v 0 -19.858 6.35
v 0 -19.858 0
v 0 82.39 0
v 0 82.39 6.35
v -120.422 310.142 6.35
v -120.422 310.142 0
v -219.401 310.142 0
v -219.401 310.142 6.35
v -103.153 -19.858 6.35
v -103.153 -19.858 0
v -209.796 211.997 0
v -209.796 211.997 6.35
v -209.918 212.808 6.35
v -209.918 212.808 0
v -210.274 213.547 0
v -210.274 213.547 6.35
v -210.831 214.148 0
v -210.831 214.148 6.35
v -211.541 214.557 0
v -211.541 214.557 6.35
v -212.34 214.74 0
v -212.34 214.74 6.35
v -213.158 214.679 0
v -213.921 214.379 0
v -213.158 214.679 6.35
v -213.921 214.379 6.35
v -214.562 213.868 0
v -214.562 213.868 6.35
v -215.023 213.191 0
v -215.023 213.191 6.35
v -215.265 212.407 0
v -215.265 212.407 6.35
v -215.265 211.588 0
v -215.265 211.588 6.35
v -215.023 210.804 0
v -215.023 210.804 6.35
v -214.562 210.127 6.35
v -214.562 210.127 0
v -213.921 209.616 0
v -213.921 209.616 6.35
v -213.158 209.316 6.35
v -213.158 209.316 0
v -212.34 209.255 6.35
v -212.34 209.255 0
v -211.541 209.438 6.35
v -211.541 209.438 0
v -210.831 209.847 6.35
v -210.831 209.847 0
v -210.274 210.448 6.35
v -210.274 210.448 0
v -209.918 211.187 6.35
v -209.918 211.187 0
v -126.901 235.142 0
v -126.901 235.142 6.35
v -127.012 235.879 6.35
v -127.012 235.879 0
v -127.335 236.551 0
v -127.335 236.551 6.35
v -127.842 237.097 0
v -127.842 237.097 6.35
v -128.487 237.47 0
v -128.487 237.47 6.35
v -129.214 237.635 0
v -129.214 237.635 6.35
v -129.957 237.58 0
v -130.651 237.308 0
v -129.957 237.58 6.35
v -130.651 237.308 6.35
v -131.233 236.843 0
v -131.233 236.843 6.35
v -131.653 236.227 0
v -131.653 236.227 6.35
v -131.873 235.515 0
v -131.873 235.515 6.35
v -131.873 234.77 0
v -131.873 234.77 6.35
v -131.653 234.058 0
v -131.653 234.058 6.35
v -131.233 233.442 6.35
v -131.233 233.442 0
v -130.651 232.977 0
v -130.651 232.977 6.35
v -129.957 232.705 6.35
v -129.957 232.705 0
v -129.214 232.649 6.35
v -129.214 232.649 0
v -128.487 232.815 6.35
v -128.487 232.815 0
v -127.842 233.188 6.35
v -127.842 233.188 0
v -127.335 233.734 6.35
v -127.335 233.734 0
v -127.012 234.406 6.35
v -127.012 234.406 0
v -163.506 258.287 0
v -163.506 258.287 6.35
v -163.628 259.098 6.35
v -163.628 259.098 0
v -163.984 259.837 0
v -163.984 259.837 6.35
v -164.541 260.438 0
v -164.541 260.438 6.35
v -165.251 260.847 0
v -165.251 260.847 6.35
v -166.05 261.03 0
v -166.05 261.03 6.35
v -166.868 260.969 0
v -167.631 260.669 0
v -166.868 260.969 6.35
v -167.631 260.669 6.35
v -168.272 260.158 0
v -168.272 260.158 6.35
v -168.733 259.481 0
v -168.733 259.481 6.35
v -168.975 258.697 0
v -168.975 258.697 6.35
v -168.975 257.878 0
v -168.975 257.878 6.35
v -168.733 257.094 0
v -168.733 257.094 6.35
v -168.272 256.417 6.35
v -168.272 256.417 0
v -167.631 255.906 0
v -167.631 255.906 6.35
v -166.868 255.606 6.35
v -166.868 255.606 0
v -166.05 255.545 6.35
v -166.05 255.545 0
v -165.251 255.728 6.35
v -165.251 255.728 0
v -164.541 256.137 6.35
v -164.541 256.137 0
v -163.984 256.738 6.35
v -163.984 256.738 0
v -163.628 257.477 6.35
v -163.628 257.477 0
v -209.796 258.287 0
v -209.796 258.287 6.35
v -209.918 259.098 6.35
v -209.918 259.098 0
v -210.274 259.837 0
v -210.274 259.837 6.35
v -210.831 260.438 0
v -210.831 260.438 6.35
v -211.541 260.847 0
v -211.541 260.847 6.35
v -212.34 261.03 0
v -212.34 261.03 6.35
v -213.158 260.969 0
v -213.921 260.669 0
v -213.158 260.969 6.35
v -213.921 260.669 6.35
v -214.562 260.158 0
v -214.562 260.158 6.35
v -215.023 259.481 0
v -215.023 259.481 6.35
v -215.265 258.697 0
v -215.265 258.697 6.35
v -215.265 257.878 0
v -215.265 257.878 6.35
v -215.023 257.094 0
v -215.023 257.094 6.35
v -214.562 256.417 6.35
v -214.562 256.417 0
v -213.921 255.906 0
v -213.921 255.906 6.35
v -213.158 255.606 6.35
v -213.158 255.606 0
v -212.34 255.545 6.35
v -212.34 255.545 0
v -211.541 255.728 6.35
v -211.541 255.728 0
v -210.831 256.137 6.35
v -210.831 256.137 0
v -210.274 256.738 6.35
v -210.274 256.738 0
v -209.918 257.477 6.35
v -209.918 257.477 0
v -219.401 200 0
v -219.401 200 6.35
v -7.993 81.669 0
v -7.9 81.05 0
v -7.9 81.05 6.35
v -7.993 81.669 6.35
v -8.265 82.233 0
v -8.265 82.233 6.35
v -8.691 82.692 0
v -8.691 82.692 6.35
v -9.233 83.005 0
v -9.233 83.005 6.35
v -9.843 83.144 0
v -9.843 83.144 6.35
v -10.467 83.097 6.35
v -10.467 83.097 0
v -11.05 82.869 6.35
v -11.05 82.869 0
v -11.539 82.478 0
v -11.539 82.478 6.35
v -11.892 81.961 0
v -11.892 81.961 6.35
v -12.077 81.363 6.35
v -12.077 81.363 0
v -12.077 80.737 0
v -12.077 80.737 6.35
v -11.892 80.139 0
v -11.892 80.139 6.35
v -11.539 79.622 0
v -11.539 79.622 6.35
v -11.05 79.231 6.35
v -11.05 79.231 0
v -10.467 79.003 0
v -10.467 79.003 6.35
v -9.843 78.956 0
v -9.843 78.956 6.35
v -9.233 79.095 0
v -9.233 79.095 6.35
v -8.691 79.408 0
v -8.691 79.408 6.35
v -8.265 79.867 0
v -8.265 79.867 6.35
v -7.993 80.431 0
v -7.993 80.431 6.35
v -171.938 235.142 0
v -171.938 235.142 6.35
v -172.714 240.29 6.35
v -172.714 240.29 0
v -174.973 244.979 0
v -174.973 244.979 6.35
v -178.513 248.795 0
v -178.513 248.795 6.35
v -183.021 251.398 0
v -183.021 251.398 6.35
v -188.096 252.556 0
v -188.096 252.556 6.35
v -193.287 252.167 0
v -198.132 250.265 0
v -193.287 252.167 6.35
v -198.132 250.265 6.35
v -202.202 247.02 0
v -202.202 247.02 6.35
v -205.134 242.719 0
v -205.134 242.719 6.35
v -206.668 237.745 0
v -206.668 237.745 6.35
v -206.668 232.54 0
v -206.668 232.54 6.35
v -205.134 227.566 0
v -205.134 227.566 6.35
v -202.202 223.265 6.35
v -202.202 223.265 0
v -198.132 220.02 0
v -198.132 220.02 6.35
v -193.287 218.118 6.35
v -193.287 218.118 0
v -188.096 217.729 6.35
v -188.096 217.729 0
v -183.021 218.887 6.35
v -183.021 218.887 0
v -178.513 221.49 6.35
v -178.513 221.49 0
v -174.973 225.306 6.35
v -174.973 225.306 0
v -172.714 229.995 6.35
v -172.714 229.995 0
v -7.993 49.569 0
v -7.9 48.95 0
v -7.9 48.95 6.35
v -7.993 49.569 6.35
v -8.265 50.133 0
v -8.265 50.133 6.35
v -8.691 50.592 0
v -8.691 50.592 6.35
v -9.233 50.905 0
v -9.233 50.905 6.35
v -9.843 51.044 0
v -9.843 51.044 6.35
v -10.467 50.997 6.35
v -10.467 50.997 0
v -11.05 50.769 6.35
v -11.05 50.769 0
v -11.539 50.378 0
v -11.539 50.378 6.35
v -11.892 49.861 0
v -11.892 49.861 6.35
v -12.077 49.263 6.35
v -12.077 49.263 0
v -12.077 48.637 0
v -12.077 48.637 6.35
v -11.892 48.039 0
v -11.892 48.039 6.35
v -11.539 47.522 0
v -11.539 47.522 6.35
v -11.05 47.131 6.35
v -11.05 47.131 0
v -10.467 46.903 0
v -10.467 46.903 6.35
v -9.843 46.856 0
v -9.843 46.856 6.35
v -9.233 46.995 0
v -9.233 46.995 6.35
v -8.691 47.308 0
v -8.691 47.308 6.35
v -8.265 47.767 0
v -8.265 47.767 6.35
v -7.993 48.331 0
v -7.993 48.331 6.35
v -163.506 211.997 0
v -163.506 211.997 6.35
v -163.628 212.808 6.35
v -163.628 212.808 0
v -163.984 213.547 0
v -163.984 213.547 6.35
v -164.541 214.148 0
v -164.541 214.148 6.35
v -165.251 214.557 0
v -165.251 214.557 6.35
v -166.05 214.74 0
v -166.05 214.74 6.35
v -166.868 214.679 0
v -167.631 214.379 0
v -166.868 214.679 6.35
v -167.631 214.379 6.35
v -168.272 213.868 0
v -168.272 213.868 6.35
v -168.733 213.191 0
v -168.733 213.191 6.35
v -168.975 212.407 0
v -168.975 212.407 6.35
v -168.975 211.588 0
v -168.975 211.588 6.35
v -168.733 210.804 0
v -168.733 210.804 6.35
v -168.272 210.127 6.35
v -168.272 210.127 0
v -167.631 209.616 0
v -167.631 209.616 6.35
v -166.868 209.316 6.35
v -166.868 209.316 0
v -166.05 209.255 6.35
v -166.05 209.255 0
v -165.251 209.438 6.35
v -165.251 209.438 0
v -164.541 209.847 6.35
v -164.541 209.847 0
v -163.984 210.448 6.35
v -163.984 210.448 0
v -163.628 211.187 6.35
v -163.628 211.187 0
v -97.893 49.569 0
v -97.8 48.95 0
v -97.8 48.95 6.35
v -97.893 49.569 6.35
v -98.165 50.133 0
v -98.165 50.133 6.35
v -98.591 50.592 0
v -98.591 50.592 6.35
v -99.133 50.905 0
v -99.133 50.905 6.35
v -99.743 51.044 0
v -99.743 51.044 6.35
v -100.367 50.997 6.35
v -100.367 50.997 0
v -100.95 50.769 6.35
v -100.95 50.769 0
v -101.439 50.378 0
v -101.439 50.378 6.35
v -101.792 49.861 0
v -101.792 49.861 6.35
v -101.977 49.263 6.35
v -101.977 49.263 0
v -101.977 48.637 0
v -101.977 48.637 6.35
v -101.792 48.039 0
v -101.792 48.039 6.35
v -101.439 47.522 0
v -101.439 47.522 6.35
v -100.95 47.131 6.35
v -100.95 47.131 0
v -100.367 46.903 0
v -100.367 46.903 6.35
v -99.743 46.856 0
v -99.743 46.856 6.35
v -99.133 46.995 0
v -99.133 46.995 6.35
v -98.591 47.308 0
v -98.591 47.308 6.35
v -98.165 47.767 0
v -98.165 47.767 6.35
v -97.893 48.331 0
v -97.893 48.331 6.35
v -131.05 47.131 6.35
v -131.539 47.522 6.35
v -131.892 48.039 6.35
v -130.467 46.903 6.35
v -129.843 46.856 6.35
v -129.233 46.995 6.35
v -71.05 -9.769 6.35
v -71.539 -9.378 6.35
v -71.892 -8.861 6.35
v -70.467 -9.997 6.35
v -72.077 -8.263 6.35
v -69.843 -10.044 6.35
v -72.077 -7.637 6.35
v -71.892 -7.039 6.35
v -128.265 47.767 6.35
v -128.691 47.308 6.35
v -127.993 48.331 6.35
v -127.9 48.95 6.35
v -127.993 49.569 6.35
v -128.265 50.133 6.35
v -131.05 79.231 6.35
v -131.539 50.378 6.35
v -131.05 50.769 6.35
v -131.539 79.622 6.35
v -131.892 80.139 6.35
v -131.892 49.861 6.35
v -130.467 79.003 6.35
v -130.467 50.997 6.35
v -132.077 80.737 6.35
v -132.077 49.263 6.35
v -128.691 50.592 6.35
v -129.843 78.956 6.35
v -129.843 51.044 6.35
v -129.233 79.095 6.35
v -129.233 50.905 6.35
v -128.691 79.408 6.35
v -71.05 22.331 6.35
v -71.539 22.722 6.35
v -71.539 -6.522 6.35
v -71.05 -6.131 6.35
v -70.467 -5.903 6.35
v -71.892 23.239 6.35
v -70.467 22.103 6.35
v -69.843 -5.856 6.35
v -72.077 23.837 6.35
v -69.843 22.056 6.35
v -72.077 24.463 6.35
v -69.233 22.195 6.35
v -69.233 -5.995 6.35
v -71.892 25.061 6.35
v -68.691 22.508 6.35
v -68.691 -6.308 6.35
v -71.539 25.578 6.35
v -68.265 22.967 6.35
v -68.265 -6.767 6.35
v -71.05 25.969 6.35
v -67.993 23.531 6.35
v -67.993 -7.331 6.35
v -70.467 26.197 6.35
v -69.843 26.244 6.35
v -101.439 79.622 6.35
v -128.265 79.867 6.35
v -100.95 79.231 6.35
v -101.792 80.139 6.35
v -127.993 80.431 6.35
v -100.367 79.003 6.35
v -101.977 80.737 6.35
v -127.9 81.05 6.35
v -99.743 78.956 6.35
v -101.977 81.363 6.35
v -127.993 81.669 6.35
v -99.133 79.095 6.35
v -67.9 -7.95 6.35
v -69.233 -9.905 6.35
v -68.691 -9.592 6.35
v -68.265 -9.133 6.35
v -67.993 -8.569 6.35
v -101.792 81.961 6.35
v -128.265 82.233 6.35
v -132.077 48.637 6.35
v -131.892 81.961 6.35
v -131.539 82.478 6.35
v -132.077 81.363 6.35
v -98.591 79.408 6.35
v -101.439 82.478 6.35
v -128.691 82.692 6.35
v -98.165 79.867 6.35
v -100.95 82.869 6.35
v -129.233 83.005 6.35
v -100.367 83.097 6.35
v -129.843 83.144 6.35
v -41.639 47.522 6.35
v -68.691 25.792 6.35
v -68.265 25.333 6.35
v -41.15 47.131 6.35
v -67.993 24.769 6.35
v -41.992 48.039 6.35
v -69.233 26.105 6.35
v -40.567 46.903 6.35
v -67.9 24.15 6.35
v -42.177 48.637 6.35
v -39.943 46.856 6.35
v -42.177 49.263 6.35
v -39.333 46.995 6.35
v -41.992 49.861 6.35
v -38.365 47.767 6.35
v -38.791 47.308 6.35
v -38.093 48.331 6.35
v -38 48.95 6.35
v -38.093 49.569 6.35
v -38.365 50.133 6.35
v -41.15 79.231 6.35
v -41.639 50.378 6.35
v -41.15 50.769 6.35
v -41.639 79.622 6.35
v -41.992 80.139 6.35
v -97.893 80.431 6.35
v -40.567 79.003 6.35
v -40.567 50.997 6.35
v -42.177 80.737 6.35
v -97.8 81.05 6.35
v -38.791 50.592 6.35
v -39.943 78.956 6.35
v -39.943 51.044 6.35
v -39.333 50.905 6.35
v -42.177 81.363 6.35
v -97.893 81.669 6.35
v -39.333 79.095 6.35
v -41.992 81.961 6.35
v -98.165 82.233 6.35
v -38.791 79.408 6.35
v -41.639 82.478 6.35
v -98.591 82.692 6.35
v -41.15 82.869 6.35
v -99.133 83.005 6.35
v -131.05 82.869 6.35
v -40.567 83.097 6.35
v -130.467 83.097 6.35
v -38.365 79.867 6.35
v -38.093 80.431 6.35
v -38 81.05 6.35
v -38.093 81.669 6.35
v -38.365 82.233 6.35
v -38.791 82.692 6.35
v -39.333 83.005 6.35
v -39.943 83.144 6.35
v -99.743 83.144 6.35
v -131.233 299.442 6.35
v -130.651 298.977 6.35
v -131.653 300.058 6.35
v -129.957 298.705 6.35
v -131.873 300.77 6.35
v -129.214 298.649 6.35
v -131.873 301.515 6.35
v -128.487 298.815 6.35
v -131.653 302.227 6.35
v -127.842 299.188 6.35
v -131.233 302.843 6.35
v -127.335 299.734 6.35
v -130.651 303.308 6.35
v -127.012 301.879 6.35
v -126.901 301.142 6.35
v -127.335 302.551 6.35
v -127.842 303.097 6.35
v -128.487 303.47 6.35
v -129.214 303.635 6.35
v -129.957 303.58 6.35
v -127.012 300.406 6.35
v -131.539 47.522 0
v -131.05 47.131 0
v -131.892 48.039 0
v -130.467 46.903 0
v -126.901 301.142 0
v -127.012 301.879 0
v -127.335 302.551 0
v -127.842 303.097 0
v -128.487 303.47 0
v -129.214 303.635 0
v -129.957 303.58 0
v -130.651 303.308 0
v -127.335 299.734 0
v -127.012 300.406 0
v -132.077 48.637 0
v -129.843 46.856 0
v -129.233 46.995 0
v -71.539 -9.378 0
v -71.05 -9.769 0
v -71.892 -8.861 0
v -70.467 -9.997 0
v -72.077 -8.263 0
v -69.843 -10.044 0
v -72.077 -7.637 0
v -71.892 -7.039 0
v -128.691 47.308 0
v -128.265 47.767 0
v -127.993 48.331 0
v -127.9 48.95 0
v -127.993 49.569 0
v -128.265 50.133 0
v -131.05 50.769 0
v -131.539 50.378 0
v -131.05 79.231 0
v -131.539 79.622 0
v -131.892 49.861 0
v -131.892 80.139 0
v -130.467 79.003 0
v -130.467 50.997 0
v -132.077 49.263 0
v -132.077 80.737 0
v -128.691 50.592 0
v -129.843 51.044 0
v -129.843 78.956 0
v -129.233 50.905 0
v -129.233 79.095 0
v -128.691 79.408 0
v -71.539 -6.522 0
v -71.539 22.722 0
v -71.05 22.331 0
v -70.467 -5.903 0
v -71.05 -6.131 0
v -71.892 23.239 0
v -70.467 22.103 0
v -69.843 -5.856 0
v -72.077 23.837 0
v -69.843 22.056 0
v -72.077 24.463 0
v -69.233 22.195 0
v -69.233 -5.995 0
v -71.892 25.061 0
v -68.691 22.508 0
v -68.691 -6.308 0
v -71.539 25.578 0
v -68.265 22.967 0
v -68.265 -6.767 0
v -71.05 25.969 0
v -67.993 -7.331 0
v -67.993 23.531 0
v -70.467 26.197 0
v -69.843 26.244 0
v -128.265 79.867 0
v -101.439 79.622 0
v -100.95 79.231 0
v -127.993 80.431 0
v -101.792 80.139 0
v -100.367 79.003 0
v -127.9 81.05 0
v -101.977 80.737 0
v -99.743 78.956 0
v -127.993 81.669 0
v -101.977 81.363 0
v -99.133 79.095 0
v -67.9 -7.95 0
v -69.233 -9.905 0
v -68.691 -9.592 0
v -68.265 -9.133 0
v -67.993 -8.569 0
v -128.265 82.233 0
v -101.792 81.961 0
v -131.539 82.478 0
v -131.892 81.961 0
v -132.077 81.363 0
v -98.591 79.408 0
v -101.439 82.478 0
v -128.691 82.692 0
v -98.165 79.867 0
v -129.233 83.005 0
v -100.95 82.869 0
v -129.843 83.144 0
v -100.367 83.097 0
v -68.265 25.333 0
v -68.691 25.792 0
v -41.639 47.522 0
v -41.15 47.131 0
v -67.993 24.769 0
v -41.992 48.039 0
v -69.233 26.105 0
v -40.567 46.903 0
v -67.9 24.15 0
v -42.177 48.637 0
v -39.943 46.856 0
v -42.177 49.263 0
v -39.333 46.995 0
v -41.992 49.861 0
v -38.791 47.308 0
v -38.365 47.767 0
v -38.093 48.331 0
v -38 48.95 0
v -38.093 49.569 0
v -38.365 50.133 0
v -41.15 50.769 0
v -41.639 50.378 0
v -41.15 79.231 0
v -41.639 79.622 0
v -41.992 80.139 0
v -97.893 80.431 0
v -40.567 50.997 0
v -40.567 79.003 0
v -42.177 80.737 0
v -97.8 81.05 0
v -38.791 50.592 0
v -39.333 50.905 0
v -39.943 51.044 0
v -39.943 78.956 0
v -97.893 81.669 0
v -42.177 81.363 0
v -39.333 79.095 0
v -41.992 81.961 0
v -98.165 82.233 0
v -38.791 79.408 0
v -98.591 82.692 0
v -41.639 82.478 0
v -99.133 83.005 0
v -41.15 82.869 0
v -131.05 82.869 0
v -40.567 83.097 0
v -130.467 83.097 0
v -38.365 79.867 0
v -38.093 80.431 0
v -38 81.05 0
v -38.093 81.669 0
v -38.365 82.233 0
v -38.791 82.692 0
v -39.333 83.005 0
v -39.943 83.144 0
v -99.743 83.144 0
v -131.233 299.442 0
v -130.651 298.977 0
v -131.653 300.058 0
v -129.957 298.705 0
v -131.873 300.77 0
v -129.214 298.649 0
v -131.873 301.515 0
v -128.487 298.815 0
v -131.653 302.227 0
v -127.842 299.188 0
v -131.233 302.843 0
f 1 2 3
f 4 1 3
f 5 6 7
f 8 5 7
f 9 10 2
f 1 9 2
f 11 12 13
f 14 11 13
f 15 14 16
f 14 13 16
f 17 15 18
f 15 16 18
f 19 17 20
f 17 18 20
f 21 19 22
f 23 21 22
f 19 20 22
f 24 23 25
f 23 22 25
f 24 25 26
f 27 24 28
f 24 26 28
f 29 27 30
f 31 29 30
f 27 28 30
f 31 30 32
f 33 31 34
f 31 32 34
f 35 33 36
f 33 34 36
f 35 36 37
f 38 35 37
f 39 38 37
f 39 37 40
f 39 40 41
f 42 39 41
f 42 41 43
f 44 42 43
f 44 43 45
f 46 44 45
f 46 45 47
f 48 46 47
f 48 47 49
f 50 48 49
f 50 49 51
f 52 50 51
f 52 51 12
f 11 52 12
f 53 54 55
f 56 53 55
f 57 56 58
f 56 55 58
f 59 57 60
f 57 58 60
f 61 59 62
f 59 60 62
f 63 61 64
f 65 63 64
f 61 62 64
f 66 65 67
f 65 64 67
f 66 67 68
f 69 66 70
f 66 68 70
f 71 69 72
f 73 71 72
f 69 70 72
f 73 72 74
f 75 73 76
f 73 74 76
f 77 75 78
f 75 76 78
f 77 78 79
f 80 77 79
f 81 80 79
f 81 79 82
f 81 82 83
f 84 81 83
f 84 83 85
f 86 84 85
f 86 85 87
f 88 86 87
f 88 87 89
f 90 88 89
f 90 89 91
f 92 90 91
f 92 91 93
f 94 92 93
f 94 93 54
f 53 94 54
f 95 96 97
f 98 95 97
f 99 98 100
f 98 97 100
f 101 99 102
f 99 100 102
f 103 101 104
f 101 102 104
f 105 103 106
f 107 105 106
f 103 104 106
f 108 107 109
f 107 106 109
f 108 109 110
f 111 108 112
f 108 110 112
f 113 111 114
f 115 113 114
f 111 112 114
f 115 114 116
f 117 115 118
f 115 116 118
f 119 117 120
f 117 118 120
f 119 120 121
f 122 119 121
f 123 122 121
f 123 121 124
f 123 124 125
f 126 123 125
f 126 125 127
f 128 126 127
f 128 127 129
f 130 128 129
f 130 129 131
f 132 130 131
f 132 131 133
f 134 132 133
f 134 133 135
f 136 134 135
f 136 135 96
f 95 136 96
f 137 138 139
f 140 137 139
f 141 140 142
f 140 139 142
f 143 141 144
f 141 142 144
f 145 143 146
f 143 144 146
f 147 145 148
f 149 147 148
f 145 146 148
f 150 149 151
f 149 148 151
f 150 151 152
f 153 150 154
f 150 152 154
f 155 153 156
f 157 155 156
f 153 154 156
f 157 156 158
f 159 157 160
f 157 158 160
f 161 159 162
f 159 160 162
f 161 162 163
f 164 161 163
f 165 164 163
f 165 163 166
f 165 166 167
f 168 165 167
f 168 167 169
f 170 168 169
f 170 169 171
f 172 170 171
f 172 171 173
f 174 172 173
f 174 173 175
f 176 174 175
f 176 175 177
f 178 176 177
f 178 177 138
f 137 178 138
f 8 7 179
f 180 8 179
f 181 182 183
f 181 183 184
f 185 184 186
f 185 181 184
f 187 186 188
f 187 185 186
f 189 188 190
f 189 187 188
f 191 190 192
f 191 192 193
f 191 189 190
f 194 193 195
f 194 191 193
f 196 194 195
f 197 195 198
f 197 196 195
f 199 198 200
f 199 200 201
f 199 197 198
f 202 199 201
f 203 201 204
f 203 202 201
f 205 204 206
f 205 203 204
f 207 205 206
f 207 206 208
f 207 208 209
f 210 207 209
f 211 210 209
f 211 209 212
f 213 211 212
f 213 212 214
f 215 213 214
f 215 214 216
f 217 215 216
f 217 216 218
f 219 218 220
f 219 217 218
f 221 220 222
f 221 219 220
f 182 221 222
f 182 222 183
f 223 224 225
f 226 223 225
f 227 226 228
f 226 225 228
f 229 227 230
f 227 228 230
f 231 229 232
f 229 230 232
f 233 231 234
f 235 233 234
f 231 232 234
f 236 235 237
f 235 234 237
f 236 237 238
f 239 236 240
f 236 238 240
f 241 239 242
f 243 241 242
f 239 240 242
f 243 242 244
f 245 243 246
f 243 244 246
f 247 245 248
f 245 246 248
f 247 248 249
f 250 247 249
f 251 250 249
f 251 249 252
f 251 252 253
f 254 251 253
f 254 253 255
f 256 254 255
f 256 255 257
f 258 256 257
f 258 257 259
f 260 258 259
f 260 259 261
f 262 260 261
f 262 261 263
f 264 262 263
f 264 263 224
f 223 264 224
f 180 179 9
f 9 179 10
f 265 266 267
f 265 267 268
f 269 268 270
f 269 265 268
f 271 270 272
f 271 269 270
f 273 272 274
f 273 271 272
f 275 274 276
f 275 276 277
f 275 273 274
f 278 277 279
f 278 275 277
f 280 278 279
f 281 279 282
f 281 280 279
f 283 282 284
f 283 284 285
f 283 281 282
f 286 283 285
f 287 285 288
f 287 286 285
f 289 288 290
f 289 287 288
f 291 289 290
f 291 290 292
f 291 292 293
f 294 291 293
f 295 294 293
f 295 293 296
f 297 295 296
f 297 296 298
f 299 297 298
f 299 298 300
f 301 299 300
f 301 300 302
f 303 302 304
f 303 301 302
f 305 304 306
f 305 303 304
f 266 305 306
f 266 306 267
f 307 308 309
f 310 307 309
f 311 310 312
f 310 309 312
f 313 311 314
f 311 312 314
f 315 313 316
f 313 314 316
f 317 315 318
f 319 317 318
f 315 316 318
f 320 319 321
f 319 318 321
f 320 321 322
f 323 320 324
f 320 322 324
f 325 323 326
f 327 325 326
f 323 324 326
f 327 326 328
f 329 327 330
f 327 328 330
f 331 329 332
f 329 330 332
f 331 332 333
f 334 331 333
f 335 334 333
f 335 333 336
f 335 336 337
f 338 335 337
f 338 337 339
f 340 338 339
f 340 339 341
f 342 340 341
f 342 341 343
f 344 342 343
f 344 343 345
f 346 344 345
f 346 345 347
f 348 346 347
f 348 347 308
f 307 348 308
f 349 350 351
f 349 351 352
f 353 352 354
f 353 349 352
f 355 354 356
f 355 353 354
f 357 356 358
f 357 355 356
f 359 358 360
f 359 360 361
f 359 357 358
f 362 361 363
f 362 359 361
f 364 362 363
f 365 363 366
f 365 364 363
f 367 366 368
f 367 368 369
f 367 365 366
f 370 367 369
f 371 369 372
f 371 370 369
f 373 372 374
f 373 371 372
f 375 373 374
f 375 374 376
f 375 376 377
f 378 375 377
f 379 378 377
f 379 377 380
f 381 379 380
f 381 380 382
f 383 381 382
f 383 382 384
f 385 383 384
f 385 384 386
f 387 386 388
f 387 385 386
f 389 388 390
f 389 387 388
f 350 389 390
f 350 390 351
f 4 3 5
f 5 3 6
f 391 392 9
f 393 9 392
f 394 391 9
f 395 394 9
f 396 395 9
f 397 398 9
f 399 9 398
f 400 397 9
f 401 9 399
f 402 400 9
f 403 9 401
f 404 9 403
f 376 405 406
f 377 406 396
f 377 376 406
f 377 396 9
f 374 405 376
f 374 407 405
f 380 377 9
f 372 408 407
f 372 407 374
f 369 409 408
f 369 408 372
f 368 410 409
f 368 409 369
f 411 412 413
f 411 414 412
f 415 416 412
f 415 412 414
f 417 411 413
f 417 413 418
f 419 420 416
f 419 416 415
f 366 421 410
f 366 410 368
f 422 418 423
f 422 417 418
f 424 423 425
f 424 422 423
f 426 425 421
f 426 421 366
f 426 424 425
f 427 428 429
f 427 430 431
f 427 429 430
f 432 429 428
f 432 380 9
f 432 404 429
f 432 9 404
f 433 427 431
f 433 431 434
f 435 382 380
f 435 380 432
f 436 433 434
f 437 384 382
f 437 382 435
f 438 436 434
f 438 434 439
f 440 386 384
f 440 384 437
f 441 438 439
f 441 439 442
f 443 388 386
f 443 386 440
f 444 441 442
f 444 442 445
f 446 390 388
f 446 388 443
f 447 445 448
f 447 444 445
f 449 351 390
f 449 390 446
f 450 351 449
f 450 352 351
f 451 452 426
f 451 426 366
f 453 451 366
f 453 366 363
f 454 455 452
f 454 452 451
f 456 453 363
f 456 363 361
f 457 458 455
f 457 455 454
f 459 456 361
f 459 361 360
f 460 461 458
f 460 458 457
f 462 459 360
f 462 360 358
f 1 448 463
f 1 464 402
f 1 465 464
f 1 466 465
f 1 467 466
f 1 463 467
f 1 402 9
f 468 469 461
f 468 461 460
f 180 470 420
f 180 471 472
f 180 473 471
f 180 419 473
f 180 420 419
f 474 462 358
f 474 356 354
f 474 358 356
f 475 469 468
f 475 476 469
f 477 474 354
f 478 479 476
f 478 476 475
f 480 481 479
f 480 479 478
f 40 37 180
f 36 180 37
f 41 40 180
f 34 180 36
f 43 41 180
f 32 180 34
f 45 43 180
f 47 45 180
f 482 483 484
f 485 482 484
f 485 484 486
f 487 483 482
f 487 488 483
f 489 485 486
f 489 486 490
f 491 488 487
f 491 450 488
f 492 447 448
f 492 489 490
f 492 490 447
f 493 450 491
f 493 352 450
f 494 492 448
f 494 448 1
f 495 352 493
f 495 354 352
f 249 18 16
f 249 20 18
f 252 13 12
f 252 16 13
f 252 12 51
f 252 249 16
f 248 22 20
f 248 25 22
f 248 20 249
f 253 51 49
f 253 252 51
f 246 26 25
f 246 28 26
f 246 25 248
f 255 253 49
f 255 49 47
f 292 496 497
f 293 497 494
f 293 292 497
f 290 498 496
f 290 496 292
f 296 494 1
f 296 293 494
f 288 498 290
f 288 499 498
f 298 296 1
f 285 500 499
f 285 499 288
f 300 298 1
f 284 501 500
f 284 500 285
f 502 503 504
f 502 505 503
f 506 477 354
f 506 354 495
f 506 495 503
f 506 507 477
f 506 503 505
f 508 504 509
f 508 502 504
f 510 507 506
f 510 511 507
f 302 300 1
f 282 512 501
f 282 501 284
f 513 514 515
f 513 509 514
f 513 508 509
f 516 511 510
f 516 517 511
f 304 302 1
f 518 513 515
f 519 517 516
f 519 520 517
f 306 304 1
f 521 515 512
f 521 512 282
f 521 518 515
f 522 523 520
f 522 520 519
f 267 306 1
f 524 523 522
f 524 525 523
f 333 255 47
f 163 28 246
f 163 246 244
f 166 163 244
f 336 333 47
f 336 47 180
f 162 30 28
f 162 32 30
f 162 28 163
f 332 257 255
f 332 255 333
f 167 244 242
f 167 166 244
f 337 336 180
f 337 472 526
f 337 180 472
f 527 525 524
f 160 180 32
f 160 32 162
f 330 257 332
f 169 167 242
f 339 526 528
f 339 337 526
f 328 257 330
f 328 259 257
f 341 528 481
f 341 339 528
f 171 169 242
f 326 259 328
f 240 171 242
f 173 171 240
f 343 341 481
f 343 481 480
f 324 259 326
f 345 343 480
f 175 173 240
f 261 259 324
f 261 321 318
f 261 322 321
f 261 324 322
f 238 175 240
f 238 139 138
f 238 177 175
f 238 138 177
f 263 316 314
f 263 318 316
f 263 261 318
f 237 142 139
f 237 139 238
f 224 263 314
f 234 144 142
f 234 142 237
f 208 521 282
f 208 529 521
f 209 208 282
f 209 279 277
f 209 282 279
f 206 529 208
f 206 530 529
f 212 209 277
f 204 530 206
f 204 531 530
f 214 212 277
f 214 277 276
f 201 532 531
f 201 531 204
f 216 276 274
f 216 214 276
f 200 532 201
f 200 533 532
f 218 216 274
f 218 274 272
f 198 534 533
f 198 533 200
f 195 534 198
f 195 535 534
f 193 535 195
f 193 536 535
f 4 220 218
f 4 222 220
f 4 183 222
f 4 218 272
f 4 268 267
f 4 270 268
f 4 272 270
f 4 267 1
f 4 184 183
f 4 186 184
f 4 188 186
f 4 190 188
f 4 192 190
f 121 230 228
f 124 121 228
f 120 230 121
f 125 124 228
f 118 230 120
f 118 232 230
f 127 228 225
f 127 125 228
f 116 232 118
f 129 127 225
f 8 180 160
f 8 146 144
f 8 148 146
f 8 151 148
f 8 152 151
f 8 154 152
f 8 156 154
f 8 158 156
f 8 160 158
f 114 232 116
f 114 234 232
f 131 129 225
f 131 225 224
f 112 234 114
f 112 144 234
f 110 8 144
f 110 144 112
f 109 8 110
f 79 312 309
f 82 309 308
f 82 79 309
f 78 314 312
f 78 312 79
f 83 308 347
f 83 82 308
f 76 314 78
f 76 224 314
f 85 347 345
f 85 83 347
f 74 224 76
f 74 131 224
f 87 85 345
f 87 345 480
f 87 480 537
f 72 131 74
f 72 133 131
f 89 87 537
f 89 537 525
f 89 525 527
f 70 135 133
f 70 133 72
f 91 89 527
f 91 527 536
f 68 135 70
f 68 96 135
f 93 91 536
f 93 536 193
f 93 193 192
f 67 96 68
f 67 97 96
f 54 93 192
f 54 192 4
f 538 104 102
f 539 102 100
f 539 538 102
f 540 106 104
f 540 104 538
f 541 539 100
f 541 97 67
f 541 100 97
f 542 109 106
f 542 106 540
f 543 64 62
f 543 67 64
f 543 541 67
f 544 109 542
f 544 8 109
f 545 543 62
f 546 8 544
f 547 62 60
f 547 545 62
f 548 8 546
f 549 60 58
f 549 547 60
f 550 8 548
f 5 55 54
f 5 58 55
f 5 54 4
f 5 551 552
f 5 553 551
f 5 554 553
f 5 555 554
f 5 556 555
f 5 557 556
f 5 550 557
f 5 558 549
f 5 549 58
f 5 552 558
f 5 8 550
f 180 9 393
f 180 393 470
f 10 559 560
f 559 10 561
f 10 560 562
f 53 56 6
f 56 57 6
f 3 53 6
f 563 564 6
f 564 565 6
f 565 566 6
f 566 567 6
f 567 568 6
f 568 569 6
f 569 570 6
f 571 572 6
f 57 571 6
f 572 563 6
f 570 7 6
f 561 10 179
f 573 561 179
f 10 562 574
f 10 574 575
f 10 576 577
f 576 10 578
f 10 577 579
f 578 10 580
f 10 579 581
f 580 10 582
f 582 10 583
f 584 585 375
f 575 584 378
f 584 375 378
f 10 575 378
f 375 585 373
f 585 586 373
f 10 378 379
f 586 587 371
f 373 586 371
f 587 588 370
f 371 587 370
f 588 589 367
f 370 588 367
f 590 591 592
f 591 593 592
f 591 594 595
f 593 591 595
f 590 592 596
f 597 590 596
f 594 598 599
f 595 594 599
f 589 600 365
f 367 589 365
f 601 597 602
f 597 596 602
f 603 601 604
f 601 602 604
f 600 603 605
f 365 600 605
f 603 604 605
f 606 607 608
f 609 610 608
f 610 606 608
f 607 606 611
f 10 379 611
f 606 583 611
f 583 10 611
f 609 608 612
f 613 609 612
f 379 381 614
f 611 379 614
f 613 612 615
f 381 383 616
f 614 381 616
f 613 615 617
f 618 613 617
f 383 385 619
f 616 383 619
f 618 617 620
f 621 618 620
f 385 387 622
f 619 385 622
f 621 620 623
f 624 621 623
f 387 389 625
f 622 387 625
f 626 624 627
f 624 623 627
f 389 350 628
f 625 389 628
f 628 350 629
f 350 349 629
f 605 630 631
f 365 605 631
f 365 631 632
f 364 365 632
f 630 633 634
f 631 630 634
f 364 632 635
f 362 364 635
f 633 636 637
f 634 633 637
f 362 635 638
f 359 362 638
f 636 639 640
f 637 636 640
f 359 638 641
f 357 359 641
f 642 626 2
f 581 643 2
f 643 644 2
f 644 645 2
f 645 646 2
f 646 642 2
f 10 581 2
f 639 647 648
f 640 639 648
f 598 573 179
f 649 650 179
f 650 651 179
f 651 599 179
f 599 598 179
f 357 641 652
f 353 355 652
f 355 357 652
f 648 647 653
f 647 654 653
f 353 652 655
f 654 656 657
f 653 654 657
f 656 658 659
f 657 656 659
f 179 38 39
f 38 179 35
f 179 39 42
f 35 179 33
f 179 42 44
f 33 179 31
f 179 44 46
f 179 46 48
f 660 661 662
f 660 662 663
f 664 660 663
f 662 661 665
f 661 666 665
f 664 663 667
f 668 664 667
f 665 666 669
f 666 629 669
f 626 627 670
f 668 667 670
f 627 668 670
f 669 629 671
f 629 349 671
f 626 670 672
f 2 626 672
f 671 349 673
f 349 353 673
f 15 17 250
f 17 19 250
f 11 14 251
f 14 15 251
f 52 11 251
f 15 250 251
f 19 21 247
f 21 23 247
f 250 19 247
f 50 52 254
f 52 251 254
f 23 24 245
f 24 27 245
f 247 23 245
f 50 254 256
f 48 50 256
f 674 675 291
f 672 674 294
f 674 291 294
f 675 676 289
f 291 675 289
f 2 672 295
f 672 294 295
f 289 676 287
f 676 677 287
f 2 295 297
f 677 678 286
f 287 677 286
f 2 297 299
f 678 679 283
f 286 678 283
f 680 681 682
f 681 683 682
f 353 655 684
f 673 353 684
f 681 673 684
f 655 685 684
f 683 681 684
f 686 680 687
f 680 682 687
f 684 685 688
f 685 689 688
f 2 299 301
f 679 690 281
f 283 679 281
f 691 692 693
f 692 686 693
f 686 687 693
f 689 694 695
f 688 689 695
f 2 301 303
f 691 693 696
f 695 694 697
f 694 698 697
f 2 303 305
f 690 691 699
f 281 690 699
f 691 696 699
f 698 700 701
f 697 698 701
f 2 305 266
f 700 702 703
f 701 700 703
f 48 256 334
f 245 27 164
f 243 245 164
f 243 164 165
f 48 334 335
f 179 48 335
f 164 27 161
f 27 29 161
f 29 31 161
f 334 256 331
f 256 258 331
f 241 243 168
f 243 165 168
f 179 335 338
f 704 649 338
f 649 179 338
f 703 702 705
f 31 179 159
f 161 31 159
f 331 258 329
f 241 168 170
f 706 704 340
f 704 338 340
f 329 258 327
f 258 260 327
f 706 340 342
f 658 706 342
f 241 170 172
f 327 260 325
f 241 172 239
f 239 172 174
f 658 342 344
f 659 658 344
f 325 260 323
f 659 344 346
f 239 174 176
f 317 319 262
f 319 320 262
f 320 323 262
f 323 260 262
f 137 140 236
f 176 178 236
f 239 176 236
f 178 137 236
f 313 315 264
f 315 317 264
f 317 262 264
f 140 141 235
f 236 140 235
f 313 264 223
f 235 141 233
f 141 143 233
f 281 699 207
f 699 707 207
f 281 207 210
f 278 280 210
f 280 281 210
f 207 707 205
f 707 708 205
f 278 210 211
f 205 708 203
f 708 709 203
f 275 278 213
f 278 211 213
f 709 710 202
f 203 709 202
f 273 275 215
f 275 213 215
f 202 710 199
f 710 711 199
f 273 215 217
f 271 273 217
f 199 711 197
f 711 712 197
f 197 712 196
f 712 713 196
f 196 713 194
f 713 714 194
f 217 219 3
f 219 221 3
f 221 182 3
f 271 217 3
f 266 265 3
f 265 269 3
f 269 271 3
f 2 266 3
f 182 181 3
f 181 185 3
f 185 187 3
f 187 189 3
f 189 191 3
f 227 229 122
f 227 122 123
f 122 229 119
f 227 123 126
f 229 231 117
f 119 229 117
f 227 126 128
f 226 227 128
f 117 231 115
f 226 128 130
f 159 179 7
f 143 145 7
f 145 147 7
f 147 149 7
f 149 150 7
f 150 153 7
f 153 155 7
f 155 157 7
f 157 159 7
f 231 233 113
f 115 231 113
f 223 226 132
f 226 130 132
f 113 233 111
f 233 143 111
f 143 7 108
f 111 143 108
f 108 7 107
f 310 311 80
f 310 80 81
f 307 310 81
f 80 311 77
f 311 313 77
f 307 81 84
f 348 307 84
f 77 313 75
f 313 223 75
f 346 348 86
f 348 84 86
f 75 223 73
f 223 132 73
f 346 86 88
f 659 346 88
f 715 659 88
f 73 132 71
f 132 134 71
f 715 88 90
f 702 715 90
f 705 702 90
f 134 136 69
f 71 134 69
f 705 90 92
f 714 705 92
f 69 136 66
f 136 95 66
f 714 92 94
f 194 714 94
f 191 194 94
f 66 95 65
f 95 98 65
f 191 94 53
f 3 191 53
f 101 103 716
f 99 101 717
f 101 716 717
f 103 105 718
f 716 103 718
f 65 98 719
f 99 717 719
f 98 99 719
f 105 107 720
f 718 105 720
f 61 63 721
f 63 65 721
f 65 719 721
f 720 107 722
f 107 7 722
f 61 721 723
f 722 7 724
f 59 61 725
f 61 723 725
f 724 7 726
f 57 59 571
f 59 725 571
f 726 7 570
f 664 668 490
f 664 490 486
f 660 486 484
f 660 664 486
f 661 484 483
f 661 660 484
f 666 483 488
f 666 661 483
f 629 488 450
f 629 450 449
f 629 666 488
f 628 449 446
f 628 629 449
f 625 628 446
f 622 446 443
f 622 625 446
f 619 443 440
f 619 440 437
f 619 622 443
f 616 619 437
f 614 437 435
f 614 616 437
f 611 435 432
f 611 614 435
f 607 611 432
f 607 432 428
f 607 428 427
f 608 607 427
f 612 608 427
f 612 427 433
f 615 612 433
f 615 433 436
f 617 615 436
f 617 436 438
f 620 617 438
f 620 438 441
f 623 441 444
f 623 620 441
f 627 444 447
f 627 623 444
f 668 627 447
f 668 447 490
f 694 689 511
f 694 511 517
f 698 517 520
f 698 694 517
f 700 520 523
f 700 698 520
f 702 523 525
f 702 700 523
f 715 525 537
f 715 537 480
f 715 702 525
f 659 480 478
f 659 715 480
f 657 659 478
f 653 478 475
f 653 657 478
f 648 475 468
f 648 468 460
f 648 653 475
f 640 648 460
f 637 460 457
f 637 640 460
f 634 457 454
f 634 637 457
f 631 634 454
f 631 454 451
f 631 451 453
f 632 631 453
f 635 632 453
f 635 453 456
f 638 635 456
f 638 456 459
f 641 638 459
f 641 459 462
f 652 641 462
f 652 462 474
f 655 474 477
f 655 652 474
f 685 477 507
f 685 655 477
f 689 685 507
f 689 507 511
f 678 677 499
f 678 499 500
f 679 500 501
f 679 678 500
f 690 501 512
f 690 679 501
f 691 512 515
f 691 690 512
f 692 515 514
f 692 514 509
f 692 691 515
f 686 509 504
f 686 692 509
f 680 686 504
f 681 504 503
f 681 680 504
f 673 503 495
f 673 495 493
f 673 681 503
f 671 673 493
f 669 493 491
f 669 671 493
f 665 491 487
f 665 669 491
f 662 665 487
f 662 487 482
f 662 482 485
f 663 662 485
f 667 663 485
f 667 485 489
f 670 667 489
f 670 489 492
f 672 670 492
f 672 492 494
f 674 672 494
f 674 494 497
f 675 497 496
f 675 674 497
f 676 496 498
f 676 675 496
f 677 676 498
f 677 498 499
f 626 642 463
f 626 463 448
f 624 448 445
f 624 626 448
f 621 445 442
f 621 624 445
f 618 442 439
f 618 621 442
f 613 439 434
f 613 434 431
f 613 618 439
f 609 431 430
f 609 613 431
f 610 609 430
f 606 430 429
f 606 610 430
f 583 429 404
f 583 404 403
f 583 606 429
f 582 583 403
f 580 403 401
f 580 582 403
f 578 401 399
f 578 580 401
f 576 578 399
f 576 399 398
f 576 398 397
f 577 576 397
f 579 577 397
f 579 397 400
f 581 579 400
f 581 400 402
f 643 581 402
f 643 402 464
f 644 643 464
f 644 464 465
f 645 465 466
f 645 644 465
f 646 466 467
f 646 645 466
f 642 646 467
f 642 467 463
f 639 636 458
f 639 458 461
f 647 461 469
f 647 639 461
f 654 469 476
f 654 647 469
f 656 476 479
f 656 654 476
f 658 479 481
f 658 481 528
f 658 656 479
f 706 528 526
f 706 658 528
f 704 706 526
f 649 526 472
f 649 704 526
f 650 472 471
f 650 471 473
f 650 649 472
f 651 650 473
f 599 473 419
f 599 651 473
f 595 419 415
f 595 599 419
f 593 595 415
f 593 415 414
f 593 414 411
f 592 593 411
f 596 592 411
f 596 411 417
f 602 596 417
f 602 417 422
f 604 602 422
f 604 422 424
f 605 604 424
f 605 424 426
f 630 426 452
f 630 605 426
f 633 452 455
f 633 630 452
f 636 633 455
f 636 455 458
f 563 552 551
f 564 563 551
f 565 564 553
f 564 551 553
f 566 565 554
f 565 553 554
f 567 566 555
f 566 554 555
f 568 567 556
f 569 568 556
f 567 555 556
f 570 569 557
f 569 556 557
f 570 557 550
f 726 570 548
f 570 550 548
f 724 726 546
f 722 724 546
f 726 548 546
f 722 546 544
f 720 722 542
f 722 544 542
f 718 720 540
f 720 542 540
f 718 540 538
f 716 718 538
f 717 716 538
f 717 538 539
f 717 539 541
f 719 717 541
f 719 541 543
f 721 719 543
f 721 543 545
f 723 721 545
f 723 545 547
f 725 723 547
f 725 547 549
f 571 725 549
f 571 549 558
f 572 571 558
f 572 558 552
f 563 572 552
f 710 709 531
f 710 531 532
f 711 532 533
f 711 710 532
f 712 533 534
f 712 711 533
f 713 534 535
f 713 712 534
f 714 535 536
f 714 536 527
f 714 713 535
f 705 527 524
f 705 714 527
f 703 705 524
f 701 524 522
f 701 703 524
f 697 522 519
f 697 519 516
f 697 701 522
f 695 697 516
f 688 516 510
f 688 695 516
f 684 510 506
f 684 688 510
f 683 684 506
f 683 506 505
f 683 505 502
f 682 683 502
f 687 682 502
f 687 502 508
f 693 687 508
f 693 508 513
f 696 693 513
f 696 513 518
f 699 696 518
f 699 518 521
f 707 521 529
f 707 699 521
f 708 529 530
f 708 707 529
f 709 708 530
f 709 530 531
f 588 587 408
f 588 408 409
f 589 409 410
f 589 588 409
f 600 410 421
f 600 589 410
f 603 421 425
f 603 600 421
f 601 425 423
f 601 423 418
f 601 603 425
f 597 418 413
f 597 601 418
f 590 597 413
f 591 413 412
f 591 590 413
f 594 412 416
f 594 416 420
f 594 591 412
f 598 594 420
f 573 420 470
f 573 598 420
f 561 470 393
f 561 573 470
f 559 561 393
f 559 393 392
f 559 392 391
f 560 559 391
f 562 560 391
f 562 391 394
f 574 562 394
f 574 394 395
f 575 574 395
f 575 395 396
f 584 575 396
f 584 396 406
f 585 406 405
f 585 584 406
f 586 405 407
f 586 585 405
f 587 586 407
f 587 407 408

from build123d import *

# Parameters (mm, degrees)
CROQUIS1_R              = 2.1
SALIENTE_EXTRUIR1_DEPTH = 6.35
CROQUIS2_R              = 2.75
CROQUIS2_R_2            = 17.4625
CROQUIS2_R_3            = 2.5
CORTAR_EXTRUIR1_DEPTH   = 12.7


with BuildPart() as part:
    # Croquis1 → Saliente-Extruir1 (new body)
    with BuildSketch(Plane.XY):
        Polygon((0, 0), (0, 82.389877484), (-120.421799317, 310.14248627), (-219.400809699, 310.14248627), (-219.400809699, 200), (-103.153458954, -19.85751373), (0, -19.85751373), align=None)
        with Locations((-40.1, 81.05)):
            Circle(CROQUIS1_R, mode=Mode.SUBTRACT)
        with Locations((-10, 81.05)):
            Circle(CROQUIS1_R, mode=Mode.SUBTRACT)
        with Locations((-10, 48.95)):
            Circle(CROQUIS1_R, mode=Mode.SUBTRACT)
        with Locations((-40.1, 48.95)):
            Circle(CROQUIS1_R, mode=Mode.SUBTRACT)
        with Locations((-130, 81.05)):
            Circle(CROQUIS1_R, mode=Mode.SUBTRACT)
        with Locations((-99.9, 81.05)):
            Circle(CROQUIS1_R, mode=Mode.SUBTRACT)
        with Locations((-99.9, 48.95)):
            Circle(CROQUIS1_R, mode=Mode.SUBTRACT)
        with Locations((-130, 48.95)):
            Circle(CROQUIS1_R, mode=Mode.SUBTRACT)
        with Locations((-70, 24.15)):
            Circle(CROQUIS1_R, mode=Mode.SUBTRACT)
        with Locations((-70, -7.95)):
            Circle(CROQUIS1_R, mode=Mode.SUBTRACT)
    extrude(amount=SALIENTE_EXTRUIR1_DEPTH)

    # Croquis2 → Cortar-Extruir1 (cut)
    with BuildSketch(Plane.XY.offset(6.35)):
        with Locations((-212.545809699, 258.28748627)):
            Circle(CROQUIS2_R)
        with Locations((-212.545809699, 211.99748627)):
            Circle(CROQUIS2_R)
        with Locations((-166.255809699, 211.99748627)):
            Circle(CROQUIS2_R)
        with Locations((-166.255809699, 258.28748627)):
            Circle(CROQUIS2_R)
        with Locations((-189.400809699, 235.14248627)):
            Circle(CROQUIS2_R_2)
        with Locations((-129.400809699, 235.14248627)):
            Circle(CROQUIS2_R_3)
        with Locations((-129.400809699, 301.14248627)):
            Circle(CROQUIS2_R_3)
    extrude(amount=-CORTAR_EXTRUIR1_DEPTH, mode=Mode.SUBTRACT)


solid = part.part
